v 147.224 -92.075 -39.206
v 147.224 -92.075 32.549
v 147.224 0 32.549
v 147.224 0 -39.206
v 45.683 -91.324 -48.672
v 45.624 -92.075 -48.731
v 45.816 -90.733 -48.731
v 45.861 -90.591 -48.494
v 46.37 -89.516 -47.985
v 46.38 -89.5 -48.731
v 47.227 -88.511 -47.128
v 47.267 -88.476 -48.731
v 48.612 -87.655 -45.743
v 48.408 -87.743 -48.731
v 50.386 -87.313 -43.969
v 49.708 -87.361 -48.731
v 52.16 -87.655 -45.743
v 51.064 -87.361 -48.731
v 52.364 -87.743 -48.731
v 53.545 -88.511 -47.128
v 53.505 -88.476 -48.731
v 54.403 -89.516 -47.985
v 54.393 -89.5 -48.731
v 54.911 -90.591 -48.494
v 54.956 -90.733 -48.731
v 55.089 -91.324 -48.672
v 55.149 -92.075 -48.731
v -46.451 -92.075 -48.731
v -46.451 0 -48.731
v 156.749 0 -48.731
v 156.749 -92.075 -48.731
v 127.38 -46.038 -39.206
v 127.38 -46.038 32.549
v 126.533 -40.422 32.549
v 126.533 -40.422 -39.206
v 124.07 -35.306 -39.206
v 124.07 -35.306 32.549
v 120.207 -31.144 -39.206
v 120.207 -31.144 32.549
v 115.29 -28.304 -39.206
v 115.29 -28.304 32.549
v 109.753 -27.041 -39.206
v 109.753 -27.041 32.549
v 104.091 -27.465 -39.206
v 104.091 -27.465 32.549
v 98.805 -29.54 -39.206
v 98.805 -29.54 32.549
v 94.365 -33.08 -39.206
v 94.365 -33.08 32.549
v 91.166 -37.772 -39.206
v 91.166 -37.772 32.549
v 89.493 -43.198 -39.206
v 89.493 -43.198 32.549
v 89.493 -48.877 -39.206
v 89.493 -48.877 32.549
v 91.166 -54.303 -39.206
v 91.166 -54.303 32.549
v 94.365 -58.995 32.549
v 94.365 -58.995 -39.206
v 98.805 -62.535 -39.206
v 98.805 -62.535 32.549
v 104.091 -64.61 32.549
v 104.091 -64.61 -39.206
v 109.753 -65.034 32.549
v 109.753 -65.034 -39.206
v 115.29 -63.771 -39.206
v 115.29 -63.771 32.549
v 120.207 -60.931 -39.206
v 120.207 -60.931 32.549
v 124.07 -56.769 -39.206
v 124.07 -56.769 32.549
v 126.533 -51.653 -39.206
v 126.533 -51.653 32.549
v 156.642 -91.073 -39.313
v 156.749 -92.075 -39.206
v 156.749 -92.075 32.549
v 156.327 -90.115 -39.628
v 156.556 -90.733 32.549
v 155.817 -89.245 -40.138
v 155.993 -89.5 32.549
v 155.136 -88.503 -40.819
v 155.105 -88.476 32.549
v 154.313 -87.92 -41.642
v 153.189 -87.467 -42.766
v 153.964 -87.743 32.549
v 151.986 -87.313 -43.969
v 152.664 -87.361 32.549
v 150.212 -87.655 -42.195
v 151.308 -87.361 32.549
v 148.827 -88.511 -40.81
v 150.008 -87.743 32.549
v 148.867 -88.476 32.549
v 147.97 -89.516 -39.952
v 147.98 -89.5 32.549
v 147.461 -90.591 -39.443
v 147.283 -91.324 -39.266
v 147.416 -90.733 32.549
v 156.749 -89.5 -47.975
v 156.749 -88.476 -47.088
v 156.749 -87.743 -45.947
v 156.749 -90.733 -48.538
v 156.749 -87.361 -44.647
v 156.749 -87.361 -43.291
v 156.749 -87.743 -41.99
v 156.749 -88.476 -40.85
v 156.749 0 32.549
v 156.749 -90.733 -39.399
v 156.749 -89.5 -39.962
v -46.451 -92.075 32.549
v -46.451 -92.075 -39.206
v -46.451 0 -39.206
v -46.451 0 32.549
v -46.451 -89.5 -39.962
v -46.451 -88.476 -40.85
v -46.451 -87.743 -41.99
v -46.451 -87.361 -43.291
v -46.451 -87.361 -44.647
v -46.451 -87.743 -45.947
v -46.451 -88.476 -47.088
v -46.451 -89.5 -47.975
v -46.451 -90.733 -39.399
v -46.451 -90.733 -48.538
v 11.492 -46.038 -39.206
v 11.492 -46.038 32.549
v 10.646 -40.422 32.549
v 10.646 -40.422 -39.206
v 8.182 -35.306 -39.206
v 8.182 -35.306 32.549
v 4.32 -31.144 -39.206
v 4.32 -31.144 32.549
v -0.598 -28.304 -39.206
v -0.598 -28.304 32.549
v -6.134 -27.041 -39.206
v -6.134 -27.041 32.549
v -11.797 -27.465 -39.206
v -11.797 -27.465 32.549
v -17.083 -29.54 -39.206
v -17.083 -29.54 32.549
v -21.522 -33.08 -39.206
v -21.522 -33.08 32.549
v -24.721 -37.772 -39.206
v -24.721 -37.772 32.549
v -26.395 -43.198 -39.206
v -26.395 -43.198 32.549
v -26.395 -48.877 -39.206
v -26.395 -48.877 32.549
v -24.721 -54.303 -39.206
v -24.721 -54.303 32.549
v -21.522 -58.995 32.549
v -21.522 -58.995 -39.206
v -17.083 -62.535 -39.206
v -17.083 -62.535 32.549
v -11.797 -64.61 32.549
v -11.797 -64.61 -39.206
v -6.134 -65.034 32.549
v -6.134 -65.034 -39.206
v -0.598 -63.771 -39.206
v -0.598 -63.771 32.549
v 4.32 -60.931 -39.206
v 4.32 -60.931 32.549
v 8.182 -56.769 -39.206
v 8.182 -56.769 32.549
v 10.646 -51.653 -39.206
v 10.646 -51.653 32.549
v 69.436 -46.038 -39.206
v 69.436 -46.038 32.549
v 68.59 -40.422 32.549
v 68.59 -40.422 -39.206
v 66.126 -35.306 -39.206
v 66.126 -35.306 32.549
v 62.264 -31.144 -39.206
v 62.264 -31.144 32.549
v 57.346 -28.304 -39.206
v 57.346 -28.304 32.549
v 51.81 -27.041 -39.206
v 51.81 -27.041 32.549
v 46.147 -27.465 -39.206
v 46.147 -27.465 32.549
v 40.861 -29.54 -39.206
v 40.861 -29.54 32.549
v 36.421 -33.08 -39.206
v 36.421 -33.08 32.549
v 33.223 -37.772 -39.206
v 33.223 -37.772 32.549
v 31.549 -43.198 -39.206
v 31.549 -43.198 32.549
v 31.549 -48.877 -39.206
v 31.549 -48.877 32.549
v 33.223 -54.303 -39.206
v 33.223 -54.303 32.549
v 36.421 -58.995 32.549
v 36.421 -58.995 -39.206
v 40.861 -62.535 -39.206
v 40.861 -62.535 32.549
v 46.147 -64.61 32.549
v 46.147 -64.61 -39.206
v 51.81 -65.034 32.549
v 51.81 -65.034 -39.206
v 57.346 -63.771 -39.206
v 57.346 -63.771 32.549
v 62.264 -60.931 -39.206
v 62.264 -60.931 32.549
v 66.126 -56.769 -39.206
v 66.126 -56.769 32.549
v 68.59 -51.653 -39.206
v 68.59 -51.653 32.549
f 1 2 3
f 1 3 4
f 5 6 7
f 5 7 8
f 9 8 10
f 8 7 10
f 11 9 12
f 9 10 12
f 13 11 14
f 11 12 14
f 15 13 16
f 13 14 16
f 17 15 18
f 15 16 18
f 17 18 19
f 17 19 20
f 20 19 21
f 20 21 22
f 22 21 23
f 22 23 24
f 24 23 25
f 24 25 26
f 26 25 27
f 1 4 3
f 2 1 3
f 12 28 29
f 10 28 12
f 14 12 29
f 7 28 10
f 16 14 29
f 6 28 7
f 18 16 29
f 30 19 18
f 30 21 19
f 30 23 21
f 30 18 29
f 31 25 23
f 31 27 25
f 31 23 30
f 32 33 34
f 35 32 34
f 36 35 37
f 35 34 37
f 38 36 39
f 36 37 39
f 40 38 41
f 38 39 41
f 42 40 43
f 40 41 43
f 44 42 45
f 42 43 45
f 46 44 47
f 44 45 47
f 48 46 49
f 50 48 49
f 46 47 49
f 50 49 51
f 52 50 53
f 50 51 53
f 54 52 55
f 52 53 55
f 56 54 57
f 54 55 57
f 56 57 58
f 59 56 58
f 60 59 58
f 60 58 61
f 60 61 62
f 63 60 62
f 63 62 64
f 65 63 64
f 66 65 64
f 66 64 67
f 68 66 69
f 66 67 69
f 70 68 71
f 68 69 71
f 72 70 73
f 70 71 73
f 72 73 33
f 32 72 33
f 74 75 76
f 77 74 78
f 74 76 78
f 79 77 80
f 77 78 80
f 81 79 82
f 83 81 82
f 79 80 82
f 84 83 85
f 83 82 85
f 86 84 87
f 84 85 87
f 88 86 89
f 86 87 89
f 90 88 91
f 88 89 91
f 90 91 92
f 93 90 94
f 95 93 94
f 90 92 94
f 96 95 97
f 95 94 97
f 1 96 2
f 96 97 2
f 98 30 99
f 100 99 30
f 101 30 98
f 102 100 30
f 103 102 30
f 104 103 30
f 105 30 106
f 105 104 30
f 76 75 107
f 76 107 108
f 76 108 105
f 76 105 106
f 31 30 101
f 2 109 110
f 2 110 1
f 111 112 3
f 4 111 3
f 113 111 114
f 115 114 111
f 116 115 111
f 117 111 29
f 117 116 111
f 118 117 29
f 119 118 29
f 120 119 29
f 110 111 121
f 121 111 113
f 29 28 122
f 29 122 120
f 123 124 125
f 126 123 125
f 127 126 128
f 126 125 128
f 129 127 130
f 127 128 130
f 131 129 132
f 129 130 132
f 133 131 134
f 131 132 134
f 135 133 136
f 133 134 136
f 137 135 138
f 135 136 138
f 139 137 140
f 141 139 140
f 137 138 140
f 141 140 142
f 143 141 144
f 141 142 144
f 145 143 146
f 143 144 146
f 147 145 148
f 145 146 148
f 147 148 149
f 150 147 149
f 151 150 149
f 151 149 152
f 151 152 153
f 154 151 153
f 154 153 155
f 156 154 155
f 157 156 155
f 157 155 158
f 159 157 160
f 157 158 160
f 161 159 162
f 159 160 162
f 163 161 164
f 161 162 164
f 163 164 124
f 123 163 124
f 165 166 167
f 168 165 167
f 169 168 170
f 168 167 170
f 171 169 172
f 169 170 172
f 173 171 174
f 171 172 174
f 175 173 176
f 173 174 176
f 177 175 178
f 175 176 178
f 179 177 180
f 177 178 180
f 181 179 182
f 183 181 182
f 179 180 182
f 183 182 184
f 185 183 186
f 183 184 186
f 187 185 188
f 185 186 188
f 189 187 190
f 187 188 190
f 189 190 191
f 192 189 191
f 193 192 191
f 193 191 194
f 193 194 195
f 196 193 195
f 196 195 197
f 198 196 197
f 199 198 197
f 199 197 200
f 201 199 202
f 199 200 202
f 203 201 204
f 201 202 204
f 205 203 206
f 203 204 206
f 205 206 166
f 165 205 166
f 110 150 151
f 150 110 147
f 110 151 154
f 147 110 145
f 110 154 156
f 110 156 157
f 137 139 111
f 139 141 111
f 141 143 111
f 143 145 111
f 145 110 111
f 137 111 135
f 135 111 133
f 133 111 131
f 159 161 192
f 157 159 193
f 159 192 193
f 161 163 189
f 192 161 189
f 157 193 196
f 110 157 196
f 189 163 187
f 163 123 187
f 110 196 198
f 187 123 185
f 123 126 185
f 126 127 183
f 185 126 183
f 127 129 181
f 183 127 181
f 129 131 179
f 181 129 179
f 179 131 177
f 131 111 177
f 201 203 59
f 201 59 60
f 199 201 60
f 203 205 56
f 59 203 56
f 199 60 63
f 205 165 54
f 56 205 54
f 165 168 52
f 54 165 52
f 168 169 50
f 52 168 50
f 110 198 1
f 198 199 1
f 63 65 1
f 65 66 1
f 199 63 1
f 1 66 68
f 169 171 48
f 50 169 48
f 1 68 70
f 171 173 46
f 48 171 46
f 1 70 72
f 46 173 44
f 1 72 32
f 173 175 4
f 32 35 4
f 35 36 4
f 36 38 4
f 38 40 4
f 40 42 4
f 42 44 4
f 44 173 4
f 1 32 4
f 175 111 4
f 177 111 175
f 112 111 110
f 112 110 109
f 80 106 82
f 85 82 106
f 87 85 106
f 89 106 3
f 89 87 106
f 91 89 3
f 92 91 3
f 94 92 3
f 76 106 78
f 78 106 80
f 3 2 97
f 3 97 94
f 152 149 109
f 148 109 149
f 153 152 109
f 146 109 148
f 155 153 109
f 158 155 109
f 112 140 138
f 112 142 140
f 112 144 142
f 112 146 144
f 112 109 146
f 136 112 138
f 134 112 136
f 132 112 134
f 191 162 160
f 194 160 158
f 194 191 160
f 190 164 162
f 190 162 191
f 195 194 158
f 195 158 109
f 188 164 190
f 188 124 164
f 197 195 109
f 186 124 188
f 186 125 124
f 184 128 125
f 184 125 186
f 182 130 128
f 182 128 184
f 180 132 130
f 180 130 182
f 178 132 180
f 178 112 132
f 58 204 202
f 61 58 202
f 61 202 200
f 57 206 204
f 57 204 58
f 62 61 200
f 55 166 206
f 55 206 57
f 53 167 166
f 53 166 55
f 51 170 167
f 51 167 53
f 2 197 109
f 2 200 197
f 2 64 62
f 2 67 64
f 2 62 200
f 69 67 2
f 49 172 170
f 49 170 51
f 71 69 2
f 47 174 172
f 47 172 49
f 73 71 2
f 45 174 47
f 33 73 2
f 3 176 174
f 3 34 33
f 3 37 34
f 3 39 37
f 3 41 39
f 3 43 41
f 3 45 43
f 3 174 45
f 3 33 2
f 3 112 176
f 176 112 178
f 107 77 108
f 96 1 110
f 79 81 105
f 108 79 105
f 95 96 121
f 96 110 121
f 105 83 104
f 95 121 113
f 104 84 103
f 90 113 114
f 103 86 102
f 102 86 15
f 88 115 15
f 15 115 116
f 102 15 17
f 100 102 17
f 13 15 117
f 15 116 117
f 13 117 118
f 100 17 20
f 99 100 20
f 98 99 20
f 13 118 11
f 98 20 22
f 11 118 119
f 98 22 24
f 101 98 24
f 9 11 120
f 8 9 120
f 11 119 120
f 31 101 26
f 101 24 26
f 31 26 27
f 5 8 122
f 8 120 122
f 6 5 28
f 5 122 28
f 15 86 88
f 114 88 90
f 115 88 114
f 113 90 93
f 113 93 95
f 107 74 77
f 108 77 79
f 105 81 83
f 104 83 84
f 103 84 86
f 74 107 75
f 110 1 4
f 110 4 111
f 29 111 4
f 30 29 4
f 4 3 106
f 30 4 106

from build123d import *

# Parameters (mm, degrees)
F0_W          = 193.675
F0_H          = 71.755
F1_DEPTH      = 92.075
F2_R          = 19.05
F3_DEPTH      = 71.755
F3_DEPTH_BACK = 25.4
F5_DEPTH      = 92.075
F6_R          = 4.7625
F7_DEPTH      = 76.5175
F8_R          = 4.7625
F9_DEPTH      = 203.2
F10_R         = 4.7625
F11_DEPTH     = 4.7625


with BuildPart() as f1:
    # F0 (on Front) → F1 (new body)
    with BuildSketch(Plane.XZ):
        with Locations((50.3860423341, -3.3288239453)):
            Rectangle(F0_W, F0_H)
    extrude(amount=F1_DEPTH)

    # F2 (on face) → F3 (cut, two sides)
    with BuildSketch(Plane.XY.offset(32.5486760547)) as f3_sk:
        with Locations((-7.5577076659, -46.0375)):
            Circle(F2_R)
        with BuildLine():
            Line((50.3860423341, -65.0875), (50.3860423341, -26.9875))
            ThreePointArc((50.3860423341, -26.9875), (31.3360423341, -46.0375), (50.3860423341, -65.0875))
        make_face()
        with BuildLine():
            ThreePointArc((50.3860423341, -65.0875), (63.8564265157, -59.5078841816), (69.4360423341, -46.0375))
            ThreePointArc((69.4360423341, -46.0375), (63.8564265157, -32.5671158184), (50.3860423341, -26.9875))
            Line((50.3860423341, -26.9875), (50.3860423341, -65.0875))
        make_face()
        with BuildLine():
            Line((127.3797923341, -46.0375), (89.2797923341, -46.0375))
            ThreePointArc((89.2797923341, -46.0375), (108.3297923341, -65.0875), (127.3797923341, -46.0375))
        make_face()
        with BuildLine():
            ThreePointArc((127.3797923341, -46.0375), (108.3297923341, -26.9875), (89.2797923341, -46.0375))
            Line((89.2797923341, -46.0375), (127.3797923341, -46.0375))
        make_face()
    extrude(amount=-F3_DEPTH, mode=Mode.SUBTRACT)
    extrude(f3_sk.sketch, amount=F3_DEPTH_BACK, mode=Mode.SUBTRACT)


with BuildPart() as f5:
    # F4 (on face) → F5 (new body)
    with BuildSketch(Plane.XZ.offset(92.075)):
        Polygon((156.7485423341, 32.5486760547), (147.2235423341, 32.5486760547), (147.2235423341, -39.2063239453), (-46.4514576659, -39.2063239453), (-46.4514576659, -48.7313239453), (156.7485423341, -48.7313239453), align=None)
    extrude(amount=-F5_DEPTH)

    # F6 (on face) → F7 (cut)
    with BuildSketch(Plane.XY.offset(32.5486760547)):
        with Locations((151.9860423341, -92.075)):
            Circle(F6_R)
    extrude(amount=-F7_DEPTH, mode=Mode.SUBTRACT)

    # F8 (on face) → F9 (cut)
    with BuildSketch(Plane(origin=(-46.4514576659, 0, 0), x_dir=(0, -1, 0), z_dir=(-1, 0, 0))):
        with Locations((92.075, -43.9688239453)):
            Circle(F8_R)
    extrude(amount=-F9_DEPTH, mode=Mode.SUBTRACT)

    # F10 (on face) → F11 (cut)
    with BuildSketch(Plane(origin=(0, 0, -48.7313239453), x_dir=(1, 0, 0), z_dir=(0, 0, -1))):
        with Locations((50.3860423341, 92.075)):
            Circle(F10_R)
    extrude(amount=-F11_DEPTH, mode=Mode.SUBTRACT)


solid = Compound([f1.part, f5.part])
